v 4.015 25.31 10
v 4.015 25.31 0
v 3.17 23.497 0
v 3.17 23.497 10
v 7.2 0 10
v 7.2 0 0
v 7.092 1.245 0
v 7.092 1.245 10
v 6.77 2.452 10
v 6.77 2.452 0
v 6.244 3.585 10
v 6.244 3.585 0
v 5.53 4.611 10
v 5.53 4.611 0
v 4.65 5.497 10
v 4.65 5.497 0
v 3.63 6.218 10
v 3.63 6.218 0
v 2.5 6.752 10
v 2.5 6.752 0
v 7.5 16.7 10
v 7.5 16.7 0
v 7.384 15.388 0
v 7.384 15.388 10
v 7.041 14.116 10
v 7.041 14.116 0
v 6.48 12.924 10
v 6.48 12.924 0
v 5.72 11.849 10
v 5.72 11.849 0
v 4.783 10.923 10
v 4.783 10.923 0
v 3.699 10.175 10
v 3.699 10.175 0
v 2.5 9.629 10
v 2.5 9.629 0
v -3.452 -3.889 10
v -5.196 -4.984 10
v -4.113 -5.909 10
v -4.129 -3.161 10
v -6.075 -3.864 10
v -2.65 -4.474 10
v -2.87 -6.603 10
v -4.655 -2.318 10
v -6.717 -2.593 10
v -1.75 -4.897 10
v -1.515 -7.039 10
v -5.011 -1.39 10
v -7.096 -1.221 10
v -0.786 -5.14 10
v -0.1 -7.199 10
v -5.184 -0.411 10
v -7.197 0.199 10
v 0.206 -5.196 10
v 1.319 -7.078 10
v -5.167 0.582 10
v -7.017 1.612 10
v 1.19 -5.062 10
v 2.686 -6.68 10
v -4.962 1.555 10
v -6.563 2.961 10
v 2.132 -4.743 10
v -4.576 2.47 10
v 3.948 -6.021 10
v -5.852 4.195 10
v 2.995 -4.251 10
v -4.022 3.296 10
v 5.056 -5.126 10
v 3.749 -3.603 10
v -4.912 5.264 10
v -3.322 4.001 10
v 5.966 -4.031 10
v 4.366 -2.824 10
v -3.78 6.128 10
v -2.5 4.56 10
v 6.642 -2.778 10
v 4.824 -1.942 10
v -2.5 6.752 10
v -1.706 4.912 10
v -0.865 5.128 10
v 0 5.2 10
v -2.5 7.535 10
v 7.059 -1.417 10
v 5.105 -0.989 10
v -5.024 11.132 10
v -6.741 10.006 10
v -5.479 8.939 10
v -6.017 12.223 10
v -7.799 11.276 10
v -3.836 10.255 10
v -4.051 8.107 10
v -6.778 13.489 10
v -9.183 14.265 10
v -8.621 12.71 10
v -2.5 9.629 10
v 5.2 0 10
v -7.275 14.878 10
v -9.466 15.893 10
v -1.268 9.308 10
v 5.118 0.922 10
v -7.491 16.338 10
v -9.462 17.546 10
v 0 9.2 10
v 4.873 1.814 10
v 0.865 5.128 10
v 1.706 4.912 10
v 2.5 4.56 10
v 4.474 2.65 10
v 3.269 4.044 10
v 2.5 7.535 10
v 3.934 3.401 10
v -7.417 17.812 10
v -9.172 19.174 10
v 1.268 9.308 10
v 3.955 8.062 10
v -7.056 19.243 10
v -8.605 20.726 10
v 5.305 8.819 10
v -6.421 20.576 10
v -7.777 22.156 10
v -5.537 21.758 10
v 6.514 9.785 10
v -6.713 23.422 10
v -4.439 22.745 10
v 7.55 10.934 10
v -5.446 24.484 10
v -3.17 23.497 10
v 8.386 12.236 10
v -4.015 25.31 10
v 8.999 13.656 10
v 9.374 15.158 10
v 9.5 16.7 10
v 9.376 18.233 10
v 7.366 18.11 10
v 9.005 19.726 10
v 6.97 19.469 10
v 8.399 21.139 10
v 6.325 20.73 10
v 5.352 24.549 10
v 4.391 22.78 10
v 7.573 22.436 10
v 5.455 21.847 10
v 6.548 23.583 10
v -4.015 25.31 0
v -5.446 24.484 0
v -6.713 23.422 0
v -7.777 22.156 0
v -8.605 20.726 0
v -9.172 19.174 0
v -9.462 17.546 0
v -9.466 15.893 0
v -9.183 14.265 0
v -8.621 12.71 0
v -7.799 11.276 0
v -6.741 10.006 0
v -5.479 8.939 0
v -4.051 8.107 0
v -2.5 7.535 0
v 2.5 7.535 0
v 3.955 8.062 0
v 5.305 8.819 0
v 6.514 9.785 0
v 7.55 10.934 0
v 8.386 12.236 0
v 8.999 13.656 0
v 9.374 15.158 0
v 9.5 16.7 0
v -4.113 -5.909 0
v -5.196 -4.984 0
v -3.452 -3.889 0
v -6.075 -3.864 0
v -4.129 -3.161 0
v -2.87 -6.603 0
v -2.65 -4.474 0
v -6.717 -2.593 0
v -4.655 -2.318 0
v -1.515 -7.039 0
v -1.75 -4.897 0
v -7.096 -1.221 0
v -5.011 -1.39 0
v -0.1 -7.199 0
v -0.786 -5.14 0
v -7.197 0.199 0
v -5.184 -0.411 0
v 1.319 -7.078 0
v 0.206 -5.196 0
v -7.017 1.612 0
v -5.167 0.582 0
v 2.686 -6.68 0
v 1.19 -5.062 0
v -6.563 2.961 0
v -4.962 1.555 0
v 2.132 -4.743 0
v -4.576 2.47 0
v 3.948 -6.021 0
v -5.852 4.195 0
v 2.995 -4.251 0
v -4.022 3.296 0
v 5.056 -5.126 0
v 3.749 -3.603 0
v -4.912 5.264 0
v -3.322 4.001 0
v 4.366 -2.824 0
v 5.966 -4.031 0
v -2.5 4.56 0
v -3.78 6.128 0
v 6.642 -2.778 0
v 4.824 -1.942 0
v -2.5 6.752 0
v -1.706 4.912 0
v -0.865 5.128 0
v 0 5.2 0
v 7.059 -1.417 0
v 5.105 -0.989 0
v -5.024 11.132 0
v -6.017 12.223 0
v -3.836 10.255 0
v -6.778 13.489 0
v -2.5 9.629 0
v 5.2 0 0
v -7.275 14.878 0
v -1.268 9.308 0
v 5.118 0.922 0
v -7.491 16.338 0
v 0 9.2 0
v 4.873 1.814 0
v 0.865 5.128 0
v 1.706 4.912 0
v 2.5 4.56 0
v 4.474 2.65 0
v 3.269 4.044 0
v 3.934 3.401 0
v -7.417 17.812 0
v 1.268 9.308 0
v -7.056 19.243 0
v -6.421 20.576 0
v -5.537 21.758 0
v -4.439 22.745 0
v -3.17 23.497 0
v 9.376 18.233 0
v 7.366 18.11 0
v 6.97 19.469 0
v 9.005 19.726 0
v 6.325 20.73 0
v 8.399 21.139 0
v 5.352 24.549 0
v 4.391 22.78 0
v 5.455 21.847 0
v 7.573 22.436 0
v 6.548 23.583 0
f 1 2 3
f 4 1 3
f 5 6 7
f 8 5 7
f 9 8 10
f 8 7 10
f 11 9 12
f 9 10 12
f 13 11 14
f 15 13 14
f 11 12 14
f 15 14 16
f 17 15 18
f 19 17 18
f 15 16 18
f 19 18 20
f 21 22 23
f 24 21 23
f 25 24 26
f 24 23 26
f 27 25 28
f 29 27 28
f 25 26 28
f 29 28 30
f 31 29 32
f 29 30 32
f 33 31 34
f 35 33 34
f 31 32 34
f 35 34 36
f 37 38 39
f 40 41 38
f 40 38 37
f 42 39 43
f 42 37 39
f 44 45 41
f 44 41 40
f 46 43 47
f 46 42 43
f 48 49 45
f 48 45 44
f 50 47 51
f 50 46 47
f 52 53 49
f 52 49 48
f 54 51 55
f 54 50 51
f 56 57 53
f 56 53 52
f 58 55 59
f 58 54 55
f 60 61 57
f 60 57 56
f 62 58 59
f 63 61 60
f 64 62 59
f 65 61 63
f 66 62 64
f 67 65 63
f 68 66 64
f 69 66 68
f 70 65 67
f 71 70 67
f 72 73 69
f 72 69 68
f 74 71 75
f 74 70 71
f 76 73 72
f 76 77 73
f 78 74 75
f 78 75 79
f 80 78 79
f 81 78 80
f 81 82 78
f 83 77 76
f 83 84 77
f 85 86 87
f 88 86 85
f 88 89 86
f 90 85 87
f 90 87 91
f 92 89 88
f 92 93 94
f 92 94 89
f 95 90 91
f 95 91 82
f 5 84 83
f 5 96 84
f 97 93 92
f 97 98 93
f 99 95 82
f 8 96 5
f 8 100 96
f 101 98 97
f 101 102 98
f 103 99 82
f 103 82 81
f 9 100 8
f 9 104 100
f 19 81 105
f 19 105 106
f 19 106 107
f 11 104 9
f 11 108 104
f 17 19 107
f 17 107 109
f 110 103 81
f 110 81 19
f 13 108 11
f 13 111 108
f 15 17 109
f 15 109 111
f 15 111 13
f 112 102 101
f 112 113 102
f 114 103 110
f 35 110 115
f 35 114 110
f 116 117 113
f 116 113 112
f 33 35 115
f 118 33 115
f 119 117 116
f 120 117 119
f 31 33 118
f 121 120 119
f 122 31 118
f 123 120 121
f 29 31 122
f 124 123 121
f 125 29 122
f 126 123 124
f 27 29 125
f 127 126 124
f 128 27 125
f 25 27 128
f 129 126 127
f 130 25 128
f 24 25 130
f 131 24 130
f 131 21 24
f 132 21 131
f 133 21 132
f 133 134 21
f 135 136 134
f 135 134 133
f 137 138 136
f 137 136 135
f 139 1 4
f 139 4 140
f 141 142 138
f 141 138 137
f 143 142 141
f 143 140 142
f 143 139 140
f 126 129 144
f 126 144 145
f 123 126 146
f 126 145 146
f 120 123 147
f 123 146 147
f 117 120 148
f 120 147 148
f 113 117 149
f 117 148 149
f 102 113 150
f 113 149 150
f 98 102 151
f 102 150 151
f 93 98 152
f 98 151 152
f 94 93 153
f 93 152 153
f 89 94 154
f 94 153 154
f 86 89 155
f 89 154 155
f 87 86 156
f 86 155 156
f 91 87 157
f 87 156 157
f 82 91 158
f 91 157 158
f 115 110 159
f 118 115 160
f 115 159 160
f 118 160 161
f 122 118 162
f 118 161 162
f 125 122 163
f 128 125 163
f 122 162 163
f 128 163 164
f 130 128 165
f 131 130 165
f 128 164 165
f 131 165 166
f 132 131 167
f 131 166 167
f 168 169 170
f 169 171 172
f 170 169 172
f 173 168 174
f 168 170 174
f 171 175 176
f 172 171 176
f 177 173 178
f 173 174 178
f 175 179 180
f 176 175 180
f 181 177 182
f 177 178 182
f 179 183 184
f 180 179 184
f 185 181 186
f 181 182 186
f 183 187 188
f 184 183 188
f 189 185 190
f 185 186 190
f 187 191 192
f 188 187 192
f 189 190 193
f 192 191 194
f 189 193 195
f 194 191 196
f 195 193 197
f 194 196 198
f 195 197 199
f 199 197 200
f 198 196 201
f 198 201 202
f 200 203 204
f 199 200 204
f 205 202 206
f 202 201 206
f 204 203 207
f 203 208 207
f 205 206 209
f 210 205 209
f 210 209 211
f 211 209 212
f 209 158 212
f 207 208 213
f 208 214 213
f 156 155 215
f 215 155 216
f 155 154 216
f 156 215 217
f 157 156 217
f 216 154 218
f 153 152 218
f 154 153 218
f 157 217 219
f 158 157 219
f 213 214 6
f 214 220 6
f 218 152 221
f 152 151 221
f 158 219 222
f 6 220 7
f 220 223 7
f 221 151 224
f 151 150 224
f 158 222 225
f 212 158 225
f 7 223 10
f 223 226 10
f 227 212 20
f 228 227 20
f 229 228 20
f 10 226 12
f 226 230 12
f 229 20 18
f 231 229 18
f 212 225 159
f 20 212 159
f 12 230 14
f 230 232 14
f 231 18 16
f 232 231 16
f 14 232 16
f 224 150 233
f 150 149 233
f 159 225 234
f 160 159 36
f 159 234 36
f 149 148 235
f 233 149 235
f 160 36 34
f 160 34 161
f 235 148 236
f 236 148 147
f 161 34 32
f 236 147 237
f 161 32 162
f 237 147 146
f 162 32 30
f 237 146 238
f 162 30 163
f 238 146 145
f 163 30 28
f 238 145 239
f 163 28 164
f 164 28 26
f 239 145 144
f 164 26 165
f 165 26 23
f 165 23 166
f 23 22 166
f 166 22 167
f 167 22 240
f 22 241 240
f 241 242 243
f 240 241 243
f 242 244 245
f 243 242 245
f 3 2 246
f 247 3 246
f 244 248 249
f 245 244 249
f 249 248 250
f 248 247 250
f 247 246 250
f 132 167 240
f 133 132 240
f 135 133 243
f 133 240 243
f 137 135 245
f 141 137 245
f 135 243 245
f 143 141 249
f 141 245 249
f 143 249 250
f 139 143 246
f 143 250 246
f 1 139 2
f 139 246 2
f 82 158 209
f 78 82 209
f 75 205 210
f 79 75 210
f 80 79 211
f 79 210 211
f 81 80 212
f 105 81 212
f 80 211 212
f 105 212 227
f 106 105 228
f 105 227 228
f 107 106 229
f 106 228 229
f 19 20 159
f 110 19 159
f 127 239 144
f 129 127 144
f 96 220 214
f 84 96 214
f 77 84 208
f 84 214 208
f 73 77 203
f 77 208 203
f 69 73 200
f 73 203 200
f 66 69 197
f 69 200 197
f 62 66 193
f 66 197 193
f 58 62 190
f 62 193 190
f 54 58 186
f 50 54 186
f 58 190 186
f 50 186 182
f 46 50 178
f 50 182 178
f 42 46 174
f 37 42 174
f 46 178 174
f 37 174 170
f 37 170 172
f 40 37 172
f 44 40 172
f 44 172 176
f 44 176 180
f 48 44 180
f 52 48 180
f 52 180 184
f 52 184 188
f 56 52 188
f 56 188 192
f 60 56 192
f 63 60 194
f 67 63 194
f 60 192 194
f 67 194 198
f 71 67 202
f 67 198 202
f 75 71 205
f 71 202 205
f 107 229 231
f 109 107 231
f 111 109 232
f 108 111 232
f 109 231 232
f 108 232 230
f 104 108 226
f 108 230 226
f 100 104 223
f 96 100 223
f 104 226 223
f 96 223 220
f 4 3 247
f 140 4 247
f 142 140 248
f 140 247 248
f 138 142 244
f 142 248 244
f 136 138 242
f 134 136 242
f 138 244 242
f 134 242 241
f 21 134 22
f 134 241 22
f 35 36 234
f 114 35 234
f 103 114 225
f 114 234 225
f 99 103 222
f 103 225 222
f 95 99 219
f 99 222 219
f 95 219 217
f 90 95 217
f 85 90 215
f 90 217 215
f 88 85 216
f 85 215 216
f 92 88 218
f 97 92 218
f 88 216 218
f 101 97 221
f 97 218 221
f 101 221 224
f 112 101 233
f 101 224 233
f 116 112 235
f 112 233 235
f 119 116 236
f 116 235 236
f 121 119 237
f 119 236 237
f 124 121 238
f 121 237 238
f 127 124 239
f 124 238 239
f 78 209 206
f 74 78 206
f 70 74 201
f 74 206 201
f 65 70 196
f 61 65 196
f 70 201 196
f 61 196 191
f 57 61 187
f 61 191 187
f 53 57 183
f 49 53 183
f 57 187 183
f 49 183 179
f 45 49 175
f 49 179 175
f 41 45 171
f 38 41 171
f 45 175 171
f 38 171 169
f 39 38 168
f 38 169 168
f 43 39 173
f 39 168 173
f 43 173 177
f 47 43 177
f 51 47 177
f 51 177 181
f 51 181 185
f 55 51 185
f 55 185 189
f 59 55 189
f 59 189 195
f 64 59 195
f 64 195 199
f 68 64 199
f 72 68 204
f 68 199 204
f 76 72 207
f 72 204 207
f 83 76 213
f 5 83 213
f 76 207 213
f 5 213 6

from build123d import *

# Parameters (mm, degrees)
F1_DEPTH = 10


with BuildPart() as f1:
    # F0 (on Top) → F1 (new body)
    with BuildSketch(Plane.XY):
        with BuildLine():
            ThreePointArc((2.5, 4.5596052461), (4.4743714642, 2.6495282599), (5.2, 0))
            ThreePointArc((5.2, 0), (-2.6495282599, -4.4743714642), (-2.5, 4.5596052461))
            Line((-2.5, 4.5596052461), (-2.5, 6.7520367298))
            ThreePointArc((-2.5, 6.7520367298), (-4.1133927602, -5.9093146811), (7.2, 0))
            ThreePointArc((7.2, 0), (5.9093146811, 4.1133927602), (2.5, 6.7520367298))
            Line((2.5, 6.7520367298), (2.5, 4.5596052461))
        make_face()
        with BuildLine():
            ThreePointArc((-4.53e-08, 7.2), (1.2699085464, 7.0871244016), (2.5, 6.7520367298))
            Line((2.5, 6.7520367298), (2.5, 7.5348486101))
            ThreePointArc((2.5, 7.5348486101), (1.261162496, 7.2840842634), (-4.53e-08, 7.2))
        make_face()
        with BuildLine():
            Line((-2.5, 7.5348486101), (-2.5, 6.7520367298))
            ThreePointArc((-2.5, 6.7520367298), (-1.269908591, 7.0871243936), (-4.53e-08, 7.2))
            ThreePointArc((-4.53e-08, 7.2), (-1.2611625409, 7.2840842694), (-2.5, 7.5348486101))
        make_face()
        with BuildLine():
            Line((2.5, 9.6289321881), (2.5, 7.5348486101))
            ThreePointArc((2.5, 7.5348486101), (7.5498344353, 10.9337187027), (9.5, 16.7))
            ThreePointArc((9.5, 16.7), (8.0122187352, 21.8043462793), (4.0148734865, 25.3099239768))
            Line((4.0148734865, 25.3099239768), (3.1696369631, 23.4973084028))
            ThreePointArc((3.1696369631, 23.4973084028), (6.3254358436, 20.7297470626), (7.5, 16.7))
            ThreePointArc((7.5, 16.7), (6.123724357, 12.3698729811), (2.5, 9.6289321881))
        make_face()
        with BuildLine():
            ThreePointArc((-2.5, 4.5596052461), (0, 5.2), (2.5, 4.5596052461))
            Line((2.5, 4.5596052461), (2.5, 6.7520367298))
            ThreePointArc((2.5, 6.7520367298), (1.2699085464, 7.0871244016), (-4.53e-08, 7.2))
            ThreePointArc((-4.53e-08, 7.2), (-1.269908591, 7.0871243936), (-2.5, 6.7520367298))
            Line((-2.5, 6.7520367298), (-2.5, 4.5596052461))
        make_face()
        with BuildLine():
            ThreePointArc((-2.5, 7.5348486101), (-1.2611625409, 7.2840842694), (-4.53e-08, 7.2))
            ThreePointArc((-4.53e-08, 7.2), (1.261162496, 7.2840842634), (2.5, 7.5348486101))
            Line((2.5, 7.5348486101), (2.5, 9.6289321881))
            ThreePointArc((2.5, 9.6289321881), (0, 9.2), (-2.5, 9.6289321881))
            Line((-2.5, 9.6289321881), (-2.5, 7.5348486101))
        make_face()
        with BuildLine():
            ThreePointArc((-4.0148734865, 25.3099239768), (-9.4656864627, 15.8932907648), (-2.5, 7.5348486101))
            Line((-2.5, 7.5348486101), (-2.5, 9.6289321881))
            ThreePointArc((-2.5, 9.6289321881), (-7.4912722905, 16.3382826116), (-3.1696369631, 23.4973084028))
            Line((-3.1696369631, 23.4973084028), (-4.0148734865, 25.3099239768))
        make_face()
    extrude(amount=F1_DEPTH)


solid = f1.part
